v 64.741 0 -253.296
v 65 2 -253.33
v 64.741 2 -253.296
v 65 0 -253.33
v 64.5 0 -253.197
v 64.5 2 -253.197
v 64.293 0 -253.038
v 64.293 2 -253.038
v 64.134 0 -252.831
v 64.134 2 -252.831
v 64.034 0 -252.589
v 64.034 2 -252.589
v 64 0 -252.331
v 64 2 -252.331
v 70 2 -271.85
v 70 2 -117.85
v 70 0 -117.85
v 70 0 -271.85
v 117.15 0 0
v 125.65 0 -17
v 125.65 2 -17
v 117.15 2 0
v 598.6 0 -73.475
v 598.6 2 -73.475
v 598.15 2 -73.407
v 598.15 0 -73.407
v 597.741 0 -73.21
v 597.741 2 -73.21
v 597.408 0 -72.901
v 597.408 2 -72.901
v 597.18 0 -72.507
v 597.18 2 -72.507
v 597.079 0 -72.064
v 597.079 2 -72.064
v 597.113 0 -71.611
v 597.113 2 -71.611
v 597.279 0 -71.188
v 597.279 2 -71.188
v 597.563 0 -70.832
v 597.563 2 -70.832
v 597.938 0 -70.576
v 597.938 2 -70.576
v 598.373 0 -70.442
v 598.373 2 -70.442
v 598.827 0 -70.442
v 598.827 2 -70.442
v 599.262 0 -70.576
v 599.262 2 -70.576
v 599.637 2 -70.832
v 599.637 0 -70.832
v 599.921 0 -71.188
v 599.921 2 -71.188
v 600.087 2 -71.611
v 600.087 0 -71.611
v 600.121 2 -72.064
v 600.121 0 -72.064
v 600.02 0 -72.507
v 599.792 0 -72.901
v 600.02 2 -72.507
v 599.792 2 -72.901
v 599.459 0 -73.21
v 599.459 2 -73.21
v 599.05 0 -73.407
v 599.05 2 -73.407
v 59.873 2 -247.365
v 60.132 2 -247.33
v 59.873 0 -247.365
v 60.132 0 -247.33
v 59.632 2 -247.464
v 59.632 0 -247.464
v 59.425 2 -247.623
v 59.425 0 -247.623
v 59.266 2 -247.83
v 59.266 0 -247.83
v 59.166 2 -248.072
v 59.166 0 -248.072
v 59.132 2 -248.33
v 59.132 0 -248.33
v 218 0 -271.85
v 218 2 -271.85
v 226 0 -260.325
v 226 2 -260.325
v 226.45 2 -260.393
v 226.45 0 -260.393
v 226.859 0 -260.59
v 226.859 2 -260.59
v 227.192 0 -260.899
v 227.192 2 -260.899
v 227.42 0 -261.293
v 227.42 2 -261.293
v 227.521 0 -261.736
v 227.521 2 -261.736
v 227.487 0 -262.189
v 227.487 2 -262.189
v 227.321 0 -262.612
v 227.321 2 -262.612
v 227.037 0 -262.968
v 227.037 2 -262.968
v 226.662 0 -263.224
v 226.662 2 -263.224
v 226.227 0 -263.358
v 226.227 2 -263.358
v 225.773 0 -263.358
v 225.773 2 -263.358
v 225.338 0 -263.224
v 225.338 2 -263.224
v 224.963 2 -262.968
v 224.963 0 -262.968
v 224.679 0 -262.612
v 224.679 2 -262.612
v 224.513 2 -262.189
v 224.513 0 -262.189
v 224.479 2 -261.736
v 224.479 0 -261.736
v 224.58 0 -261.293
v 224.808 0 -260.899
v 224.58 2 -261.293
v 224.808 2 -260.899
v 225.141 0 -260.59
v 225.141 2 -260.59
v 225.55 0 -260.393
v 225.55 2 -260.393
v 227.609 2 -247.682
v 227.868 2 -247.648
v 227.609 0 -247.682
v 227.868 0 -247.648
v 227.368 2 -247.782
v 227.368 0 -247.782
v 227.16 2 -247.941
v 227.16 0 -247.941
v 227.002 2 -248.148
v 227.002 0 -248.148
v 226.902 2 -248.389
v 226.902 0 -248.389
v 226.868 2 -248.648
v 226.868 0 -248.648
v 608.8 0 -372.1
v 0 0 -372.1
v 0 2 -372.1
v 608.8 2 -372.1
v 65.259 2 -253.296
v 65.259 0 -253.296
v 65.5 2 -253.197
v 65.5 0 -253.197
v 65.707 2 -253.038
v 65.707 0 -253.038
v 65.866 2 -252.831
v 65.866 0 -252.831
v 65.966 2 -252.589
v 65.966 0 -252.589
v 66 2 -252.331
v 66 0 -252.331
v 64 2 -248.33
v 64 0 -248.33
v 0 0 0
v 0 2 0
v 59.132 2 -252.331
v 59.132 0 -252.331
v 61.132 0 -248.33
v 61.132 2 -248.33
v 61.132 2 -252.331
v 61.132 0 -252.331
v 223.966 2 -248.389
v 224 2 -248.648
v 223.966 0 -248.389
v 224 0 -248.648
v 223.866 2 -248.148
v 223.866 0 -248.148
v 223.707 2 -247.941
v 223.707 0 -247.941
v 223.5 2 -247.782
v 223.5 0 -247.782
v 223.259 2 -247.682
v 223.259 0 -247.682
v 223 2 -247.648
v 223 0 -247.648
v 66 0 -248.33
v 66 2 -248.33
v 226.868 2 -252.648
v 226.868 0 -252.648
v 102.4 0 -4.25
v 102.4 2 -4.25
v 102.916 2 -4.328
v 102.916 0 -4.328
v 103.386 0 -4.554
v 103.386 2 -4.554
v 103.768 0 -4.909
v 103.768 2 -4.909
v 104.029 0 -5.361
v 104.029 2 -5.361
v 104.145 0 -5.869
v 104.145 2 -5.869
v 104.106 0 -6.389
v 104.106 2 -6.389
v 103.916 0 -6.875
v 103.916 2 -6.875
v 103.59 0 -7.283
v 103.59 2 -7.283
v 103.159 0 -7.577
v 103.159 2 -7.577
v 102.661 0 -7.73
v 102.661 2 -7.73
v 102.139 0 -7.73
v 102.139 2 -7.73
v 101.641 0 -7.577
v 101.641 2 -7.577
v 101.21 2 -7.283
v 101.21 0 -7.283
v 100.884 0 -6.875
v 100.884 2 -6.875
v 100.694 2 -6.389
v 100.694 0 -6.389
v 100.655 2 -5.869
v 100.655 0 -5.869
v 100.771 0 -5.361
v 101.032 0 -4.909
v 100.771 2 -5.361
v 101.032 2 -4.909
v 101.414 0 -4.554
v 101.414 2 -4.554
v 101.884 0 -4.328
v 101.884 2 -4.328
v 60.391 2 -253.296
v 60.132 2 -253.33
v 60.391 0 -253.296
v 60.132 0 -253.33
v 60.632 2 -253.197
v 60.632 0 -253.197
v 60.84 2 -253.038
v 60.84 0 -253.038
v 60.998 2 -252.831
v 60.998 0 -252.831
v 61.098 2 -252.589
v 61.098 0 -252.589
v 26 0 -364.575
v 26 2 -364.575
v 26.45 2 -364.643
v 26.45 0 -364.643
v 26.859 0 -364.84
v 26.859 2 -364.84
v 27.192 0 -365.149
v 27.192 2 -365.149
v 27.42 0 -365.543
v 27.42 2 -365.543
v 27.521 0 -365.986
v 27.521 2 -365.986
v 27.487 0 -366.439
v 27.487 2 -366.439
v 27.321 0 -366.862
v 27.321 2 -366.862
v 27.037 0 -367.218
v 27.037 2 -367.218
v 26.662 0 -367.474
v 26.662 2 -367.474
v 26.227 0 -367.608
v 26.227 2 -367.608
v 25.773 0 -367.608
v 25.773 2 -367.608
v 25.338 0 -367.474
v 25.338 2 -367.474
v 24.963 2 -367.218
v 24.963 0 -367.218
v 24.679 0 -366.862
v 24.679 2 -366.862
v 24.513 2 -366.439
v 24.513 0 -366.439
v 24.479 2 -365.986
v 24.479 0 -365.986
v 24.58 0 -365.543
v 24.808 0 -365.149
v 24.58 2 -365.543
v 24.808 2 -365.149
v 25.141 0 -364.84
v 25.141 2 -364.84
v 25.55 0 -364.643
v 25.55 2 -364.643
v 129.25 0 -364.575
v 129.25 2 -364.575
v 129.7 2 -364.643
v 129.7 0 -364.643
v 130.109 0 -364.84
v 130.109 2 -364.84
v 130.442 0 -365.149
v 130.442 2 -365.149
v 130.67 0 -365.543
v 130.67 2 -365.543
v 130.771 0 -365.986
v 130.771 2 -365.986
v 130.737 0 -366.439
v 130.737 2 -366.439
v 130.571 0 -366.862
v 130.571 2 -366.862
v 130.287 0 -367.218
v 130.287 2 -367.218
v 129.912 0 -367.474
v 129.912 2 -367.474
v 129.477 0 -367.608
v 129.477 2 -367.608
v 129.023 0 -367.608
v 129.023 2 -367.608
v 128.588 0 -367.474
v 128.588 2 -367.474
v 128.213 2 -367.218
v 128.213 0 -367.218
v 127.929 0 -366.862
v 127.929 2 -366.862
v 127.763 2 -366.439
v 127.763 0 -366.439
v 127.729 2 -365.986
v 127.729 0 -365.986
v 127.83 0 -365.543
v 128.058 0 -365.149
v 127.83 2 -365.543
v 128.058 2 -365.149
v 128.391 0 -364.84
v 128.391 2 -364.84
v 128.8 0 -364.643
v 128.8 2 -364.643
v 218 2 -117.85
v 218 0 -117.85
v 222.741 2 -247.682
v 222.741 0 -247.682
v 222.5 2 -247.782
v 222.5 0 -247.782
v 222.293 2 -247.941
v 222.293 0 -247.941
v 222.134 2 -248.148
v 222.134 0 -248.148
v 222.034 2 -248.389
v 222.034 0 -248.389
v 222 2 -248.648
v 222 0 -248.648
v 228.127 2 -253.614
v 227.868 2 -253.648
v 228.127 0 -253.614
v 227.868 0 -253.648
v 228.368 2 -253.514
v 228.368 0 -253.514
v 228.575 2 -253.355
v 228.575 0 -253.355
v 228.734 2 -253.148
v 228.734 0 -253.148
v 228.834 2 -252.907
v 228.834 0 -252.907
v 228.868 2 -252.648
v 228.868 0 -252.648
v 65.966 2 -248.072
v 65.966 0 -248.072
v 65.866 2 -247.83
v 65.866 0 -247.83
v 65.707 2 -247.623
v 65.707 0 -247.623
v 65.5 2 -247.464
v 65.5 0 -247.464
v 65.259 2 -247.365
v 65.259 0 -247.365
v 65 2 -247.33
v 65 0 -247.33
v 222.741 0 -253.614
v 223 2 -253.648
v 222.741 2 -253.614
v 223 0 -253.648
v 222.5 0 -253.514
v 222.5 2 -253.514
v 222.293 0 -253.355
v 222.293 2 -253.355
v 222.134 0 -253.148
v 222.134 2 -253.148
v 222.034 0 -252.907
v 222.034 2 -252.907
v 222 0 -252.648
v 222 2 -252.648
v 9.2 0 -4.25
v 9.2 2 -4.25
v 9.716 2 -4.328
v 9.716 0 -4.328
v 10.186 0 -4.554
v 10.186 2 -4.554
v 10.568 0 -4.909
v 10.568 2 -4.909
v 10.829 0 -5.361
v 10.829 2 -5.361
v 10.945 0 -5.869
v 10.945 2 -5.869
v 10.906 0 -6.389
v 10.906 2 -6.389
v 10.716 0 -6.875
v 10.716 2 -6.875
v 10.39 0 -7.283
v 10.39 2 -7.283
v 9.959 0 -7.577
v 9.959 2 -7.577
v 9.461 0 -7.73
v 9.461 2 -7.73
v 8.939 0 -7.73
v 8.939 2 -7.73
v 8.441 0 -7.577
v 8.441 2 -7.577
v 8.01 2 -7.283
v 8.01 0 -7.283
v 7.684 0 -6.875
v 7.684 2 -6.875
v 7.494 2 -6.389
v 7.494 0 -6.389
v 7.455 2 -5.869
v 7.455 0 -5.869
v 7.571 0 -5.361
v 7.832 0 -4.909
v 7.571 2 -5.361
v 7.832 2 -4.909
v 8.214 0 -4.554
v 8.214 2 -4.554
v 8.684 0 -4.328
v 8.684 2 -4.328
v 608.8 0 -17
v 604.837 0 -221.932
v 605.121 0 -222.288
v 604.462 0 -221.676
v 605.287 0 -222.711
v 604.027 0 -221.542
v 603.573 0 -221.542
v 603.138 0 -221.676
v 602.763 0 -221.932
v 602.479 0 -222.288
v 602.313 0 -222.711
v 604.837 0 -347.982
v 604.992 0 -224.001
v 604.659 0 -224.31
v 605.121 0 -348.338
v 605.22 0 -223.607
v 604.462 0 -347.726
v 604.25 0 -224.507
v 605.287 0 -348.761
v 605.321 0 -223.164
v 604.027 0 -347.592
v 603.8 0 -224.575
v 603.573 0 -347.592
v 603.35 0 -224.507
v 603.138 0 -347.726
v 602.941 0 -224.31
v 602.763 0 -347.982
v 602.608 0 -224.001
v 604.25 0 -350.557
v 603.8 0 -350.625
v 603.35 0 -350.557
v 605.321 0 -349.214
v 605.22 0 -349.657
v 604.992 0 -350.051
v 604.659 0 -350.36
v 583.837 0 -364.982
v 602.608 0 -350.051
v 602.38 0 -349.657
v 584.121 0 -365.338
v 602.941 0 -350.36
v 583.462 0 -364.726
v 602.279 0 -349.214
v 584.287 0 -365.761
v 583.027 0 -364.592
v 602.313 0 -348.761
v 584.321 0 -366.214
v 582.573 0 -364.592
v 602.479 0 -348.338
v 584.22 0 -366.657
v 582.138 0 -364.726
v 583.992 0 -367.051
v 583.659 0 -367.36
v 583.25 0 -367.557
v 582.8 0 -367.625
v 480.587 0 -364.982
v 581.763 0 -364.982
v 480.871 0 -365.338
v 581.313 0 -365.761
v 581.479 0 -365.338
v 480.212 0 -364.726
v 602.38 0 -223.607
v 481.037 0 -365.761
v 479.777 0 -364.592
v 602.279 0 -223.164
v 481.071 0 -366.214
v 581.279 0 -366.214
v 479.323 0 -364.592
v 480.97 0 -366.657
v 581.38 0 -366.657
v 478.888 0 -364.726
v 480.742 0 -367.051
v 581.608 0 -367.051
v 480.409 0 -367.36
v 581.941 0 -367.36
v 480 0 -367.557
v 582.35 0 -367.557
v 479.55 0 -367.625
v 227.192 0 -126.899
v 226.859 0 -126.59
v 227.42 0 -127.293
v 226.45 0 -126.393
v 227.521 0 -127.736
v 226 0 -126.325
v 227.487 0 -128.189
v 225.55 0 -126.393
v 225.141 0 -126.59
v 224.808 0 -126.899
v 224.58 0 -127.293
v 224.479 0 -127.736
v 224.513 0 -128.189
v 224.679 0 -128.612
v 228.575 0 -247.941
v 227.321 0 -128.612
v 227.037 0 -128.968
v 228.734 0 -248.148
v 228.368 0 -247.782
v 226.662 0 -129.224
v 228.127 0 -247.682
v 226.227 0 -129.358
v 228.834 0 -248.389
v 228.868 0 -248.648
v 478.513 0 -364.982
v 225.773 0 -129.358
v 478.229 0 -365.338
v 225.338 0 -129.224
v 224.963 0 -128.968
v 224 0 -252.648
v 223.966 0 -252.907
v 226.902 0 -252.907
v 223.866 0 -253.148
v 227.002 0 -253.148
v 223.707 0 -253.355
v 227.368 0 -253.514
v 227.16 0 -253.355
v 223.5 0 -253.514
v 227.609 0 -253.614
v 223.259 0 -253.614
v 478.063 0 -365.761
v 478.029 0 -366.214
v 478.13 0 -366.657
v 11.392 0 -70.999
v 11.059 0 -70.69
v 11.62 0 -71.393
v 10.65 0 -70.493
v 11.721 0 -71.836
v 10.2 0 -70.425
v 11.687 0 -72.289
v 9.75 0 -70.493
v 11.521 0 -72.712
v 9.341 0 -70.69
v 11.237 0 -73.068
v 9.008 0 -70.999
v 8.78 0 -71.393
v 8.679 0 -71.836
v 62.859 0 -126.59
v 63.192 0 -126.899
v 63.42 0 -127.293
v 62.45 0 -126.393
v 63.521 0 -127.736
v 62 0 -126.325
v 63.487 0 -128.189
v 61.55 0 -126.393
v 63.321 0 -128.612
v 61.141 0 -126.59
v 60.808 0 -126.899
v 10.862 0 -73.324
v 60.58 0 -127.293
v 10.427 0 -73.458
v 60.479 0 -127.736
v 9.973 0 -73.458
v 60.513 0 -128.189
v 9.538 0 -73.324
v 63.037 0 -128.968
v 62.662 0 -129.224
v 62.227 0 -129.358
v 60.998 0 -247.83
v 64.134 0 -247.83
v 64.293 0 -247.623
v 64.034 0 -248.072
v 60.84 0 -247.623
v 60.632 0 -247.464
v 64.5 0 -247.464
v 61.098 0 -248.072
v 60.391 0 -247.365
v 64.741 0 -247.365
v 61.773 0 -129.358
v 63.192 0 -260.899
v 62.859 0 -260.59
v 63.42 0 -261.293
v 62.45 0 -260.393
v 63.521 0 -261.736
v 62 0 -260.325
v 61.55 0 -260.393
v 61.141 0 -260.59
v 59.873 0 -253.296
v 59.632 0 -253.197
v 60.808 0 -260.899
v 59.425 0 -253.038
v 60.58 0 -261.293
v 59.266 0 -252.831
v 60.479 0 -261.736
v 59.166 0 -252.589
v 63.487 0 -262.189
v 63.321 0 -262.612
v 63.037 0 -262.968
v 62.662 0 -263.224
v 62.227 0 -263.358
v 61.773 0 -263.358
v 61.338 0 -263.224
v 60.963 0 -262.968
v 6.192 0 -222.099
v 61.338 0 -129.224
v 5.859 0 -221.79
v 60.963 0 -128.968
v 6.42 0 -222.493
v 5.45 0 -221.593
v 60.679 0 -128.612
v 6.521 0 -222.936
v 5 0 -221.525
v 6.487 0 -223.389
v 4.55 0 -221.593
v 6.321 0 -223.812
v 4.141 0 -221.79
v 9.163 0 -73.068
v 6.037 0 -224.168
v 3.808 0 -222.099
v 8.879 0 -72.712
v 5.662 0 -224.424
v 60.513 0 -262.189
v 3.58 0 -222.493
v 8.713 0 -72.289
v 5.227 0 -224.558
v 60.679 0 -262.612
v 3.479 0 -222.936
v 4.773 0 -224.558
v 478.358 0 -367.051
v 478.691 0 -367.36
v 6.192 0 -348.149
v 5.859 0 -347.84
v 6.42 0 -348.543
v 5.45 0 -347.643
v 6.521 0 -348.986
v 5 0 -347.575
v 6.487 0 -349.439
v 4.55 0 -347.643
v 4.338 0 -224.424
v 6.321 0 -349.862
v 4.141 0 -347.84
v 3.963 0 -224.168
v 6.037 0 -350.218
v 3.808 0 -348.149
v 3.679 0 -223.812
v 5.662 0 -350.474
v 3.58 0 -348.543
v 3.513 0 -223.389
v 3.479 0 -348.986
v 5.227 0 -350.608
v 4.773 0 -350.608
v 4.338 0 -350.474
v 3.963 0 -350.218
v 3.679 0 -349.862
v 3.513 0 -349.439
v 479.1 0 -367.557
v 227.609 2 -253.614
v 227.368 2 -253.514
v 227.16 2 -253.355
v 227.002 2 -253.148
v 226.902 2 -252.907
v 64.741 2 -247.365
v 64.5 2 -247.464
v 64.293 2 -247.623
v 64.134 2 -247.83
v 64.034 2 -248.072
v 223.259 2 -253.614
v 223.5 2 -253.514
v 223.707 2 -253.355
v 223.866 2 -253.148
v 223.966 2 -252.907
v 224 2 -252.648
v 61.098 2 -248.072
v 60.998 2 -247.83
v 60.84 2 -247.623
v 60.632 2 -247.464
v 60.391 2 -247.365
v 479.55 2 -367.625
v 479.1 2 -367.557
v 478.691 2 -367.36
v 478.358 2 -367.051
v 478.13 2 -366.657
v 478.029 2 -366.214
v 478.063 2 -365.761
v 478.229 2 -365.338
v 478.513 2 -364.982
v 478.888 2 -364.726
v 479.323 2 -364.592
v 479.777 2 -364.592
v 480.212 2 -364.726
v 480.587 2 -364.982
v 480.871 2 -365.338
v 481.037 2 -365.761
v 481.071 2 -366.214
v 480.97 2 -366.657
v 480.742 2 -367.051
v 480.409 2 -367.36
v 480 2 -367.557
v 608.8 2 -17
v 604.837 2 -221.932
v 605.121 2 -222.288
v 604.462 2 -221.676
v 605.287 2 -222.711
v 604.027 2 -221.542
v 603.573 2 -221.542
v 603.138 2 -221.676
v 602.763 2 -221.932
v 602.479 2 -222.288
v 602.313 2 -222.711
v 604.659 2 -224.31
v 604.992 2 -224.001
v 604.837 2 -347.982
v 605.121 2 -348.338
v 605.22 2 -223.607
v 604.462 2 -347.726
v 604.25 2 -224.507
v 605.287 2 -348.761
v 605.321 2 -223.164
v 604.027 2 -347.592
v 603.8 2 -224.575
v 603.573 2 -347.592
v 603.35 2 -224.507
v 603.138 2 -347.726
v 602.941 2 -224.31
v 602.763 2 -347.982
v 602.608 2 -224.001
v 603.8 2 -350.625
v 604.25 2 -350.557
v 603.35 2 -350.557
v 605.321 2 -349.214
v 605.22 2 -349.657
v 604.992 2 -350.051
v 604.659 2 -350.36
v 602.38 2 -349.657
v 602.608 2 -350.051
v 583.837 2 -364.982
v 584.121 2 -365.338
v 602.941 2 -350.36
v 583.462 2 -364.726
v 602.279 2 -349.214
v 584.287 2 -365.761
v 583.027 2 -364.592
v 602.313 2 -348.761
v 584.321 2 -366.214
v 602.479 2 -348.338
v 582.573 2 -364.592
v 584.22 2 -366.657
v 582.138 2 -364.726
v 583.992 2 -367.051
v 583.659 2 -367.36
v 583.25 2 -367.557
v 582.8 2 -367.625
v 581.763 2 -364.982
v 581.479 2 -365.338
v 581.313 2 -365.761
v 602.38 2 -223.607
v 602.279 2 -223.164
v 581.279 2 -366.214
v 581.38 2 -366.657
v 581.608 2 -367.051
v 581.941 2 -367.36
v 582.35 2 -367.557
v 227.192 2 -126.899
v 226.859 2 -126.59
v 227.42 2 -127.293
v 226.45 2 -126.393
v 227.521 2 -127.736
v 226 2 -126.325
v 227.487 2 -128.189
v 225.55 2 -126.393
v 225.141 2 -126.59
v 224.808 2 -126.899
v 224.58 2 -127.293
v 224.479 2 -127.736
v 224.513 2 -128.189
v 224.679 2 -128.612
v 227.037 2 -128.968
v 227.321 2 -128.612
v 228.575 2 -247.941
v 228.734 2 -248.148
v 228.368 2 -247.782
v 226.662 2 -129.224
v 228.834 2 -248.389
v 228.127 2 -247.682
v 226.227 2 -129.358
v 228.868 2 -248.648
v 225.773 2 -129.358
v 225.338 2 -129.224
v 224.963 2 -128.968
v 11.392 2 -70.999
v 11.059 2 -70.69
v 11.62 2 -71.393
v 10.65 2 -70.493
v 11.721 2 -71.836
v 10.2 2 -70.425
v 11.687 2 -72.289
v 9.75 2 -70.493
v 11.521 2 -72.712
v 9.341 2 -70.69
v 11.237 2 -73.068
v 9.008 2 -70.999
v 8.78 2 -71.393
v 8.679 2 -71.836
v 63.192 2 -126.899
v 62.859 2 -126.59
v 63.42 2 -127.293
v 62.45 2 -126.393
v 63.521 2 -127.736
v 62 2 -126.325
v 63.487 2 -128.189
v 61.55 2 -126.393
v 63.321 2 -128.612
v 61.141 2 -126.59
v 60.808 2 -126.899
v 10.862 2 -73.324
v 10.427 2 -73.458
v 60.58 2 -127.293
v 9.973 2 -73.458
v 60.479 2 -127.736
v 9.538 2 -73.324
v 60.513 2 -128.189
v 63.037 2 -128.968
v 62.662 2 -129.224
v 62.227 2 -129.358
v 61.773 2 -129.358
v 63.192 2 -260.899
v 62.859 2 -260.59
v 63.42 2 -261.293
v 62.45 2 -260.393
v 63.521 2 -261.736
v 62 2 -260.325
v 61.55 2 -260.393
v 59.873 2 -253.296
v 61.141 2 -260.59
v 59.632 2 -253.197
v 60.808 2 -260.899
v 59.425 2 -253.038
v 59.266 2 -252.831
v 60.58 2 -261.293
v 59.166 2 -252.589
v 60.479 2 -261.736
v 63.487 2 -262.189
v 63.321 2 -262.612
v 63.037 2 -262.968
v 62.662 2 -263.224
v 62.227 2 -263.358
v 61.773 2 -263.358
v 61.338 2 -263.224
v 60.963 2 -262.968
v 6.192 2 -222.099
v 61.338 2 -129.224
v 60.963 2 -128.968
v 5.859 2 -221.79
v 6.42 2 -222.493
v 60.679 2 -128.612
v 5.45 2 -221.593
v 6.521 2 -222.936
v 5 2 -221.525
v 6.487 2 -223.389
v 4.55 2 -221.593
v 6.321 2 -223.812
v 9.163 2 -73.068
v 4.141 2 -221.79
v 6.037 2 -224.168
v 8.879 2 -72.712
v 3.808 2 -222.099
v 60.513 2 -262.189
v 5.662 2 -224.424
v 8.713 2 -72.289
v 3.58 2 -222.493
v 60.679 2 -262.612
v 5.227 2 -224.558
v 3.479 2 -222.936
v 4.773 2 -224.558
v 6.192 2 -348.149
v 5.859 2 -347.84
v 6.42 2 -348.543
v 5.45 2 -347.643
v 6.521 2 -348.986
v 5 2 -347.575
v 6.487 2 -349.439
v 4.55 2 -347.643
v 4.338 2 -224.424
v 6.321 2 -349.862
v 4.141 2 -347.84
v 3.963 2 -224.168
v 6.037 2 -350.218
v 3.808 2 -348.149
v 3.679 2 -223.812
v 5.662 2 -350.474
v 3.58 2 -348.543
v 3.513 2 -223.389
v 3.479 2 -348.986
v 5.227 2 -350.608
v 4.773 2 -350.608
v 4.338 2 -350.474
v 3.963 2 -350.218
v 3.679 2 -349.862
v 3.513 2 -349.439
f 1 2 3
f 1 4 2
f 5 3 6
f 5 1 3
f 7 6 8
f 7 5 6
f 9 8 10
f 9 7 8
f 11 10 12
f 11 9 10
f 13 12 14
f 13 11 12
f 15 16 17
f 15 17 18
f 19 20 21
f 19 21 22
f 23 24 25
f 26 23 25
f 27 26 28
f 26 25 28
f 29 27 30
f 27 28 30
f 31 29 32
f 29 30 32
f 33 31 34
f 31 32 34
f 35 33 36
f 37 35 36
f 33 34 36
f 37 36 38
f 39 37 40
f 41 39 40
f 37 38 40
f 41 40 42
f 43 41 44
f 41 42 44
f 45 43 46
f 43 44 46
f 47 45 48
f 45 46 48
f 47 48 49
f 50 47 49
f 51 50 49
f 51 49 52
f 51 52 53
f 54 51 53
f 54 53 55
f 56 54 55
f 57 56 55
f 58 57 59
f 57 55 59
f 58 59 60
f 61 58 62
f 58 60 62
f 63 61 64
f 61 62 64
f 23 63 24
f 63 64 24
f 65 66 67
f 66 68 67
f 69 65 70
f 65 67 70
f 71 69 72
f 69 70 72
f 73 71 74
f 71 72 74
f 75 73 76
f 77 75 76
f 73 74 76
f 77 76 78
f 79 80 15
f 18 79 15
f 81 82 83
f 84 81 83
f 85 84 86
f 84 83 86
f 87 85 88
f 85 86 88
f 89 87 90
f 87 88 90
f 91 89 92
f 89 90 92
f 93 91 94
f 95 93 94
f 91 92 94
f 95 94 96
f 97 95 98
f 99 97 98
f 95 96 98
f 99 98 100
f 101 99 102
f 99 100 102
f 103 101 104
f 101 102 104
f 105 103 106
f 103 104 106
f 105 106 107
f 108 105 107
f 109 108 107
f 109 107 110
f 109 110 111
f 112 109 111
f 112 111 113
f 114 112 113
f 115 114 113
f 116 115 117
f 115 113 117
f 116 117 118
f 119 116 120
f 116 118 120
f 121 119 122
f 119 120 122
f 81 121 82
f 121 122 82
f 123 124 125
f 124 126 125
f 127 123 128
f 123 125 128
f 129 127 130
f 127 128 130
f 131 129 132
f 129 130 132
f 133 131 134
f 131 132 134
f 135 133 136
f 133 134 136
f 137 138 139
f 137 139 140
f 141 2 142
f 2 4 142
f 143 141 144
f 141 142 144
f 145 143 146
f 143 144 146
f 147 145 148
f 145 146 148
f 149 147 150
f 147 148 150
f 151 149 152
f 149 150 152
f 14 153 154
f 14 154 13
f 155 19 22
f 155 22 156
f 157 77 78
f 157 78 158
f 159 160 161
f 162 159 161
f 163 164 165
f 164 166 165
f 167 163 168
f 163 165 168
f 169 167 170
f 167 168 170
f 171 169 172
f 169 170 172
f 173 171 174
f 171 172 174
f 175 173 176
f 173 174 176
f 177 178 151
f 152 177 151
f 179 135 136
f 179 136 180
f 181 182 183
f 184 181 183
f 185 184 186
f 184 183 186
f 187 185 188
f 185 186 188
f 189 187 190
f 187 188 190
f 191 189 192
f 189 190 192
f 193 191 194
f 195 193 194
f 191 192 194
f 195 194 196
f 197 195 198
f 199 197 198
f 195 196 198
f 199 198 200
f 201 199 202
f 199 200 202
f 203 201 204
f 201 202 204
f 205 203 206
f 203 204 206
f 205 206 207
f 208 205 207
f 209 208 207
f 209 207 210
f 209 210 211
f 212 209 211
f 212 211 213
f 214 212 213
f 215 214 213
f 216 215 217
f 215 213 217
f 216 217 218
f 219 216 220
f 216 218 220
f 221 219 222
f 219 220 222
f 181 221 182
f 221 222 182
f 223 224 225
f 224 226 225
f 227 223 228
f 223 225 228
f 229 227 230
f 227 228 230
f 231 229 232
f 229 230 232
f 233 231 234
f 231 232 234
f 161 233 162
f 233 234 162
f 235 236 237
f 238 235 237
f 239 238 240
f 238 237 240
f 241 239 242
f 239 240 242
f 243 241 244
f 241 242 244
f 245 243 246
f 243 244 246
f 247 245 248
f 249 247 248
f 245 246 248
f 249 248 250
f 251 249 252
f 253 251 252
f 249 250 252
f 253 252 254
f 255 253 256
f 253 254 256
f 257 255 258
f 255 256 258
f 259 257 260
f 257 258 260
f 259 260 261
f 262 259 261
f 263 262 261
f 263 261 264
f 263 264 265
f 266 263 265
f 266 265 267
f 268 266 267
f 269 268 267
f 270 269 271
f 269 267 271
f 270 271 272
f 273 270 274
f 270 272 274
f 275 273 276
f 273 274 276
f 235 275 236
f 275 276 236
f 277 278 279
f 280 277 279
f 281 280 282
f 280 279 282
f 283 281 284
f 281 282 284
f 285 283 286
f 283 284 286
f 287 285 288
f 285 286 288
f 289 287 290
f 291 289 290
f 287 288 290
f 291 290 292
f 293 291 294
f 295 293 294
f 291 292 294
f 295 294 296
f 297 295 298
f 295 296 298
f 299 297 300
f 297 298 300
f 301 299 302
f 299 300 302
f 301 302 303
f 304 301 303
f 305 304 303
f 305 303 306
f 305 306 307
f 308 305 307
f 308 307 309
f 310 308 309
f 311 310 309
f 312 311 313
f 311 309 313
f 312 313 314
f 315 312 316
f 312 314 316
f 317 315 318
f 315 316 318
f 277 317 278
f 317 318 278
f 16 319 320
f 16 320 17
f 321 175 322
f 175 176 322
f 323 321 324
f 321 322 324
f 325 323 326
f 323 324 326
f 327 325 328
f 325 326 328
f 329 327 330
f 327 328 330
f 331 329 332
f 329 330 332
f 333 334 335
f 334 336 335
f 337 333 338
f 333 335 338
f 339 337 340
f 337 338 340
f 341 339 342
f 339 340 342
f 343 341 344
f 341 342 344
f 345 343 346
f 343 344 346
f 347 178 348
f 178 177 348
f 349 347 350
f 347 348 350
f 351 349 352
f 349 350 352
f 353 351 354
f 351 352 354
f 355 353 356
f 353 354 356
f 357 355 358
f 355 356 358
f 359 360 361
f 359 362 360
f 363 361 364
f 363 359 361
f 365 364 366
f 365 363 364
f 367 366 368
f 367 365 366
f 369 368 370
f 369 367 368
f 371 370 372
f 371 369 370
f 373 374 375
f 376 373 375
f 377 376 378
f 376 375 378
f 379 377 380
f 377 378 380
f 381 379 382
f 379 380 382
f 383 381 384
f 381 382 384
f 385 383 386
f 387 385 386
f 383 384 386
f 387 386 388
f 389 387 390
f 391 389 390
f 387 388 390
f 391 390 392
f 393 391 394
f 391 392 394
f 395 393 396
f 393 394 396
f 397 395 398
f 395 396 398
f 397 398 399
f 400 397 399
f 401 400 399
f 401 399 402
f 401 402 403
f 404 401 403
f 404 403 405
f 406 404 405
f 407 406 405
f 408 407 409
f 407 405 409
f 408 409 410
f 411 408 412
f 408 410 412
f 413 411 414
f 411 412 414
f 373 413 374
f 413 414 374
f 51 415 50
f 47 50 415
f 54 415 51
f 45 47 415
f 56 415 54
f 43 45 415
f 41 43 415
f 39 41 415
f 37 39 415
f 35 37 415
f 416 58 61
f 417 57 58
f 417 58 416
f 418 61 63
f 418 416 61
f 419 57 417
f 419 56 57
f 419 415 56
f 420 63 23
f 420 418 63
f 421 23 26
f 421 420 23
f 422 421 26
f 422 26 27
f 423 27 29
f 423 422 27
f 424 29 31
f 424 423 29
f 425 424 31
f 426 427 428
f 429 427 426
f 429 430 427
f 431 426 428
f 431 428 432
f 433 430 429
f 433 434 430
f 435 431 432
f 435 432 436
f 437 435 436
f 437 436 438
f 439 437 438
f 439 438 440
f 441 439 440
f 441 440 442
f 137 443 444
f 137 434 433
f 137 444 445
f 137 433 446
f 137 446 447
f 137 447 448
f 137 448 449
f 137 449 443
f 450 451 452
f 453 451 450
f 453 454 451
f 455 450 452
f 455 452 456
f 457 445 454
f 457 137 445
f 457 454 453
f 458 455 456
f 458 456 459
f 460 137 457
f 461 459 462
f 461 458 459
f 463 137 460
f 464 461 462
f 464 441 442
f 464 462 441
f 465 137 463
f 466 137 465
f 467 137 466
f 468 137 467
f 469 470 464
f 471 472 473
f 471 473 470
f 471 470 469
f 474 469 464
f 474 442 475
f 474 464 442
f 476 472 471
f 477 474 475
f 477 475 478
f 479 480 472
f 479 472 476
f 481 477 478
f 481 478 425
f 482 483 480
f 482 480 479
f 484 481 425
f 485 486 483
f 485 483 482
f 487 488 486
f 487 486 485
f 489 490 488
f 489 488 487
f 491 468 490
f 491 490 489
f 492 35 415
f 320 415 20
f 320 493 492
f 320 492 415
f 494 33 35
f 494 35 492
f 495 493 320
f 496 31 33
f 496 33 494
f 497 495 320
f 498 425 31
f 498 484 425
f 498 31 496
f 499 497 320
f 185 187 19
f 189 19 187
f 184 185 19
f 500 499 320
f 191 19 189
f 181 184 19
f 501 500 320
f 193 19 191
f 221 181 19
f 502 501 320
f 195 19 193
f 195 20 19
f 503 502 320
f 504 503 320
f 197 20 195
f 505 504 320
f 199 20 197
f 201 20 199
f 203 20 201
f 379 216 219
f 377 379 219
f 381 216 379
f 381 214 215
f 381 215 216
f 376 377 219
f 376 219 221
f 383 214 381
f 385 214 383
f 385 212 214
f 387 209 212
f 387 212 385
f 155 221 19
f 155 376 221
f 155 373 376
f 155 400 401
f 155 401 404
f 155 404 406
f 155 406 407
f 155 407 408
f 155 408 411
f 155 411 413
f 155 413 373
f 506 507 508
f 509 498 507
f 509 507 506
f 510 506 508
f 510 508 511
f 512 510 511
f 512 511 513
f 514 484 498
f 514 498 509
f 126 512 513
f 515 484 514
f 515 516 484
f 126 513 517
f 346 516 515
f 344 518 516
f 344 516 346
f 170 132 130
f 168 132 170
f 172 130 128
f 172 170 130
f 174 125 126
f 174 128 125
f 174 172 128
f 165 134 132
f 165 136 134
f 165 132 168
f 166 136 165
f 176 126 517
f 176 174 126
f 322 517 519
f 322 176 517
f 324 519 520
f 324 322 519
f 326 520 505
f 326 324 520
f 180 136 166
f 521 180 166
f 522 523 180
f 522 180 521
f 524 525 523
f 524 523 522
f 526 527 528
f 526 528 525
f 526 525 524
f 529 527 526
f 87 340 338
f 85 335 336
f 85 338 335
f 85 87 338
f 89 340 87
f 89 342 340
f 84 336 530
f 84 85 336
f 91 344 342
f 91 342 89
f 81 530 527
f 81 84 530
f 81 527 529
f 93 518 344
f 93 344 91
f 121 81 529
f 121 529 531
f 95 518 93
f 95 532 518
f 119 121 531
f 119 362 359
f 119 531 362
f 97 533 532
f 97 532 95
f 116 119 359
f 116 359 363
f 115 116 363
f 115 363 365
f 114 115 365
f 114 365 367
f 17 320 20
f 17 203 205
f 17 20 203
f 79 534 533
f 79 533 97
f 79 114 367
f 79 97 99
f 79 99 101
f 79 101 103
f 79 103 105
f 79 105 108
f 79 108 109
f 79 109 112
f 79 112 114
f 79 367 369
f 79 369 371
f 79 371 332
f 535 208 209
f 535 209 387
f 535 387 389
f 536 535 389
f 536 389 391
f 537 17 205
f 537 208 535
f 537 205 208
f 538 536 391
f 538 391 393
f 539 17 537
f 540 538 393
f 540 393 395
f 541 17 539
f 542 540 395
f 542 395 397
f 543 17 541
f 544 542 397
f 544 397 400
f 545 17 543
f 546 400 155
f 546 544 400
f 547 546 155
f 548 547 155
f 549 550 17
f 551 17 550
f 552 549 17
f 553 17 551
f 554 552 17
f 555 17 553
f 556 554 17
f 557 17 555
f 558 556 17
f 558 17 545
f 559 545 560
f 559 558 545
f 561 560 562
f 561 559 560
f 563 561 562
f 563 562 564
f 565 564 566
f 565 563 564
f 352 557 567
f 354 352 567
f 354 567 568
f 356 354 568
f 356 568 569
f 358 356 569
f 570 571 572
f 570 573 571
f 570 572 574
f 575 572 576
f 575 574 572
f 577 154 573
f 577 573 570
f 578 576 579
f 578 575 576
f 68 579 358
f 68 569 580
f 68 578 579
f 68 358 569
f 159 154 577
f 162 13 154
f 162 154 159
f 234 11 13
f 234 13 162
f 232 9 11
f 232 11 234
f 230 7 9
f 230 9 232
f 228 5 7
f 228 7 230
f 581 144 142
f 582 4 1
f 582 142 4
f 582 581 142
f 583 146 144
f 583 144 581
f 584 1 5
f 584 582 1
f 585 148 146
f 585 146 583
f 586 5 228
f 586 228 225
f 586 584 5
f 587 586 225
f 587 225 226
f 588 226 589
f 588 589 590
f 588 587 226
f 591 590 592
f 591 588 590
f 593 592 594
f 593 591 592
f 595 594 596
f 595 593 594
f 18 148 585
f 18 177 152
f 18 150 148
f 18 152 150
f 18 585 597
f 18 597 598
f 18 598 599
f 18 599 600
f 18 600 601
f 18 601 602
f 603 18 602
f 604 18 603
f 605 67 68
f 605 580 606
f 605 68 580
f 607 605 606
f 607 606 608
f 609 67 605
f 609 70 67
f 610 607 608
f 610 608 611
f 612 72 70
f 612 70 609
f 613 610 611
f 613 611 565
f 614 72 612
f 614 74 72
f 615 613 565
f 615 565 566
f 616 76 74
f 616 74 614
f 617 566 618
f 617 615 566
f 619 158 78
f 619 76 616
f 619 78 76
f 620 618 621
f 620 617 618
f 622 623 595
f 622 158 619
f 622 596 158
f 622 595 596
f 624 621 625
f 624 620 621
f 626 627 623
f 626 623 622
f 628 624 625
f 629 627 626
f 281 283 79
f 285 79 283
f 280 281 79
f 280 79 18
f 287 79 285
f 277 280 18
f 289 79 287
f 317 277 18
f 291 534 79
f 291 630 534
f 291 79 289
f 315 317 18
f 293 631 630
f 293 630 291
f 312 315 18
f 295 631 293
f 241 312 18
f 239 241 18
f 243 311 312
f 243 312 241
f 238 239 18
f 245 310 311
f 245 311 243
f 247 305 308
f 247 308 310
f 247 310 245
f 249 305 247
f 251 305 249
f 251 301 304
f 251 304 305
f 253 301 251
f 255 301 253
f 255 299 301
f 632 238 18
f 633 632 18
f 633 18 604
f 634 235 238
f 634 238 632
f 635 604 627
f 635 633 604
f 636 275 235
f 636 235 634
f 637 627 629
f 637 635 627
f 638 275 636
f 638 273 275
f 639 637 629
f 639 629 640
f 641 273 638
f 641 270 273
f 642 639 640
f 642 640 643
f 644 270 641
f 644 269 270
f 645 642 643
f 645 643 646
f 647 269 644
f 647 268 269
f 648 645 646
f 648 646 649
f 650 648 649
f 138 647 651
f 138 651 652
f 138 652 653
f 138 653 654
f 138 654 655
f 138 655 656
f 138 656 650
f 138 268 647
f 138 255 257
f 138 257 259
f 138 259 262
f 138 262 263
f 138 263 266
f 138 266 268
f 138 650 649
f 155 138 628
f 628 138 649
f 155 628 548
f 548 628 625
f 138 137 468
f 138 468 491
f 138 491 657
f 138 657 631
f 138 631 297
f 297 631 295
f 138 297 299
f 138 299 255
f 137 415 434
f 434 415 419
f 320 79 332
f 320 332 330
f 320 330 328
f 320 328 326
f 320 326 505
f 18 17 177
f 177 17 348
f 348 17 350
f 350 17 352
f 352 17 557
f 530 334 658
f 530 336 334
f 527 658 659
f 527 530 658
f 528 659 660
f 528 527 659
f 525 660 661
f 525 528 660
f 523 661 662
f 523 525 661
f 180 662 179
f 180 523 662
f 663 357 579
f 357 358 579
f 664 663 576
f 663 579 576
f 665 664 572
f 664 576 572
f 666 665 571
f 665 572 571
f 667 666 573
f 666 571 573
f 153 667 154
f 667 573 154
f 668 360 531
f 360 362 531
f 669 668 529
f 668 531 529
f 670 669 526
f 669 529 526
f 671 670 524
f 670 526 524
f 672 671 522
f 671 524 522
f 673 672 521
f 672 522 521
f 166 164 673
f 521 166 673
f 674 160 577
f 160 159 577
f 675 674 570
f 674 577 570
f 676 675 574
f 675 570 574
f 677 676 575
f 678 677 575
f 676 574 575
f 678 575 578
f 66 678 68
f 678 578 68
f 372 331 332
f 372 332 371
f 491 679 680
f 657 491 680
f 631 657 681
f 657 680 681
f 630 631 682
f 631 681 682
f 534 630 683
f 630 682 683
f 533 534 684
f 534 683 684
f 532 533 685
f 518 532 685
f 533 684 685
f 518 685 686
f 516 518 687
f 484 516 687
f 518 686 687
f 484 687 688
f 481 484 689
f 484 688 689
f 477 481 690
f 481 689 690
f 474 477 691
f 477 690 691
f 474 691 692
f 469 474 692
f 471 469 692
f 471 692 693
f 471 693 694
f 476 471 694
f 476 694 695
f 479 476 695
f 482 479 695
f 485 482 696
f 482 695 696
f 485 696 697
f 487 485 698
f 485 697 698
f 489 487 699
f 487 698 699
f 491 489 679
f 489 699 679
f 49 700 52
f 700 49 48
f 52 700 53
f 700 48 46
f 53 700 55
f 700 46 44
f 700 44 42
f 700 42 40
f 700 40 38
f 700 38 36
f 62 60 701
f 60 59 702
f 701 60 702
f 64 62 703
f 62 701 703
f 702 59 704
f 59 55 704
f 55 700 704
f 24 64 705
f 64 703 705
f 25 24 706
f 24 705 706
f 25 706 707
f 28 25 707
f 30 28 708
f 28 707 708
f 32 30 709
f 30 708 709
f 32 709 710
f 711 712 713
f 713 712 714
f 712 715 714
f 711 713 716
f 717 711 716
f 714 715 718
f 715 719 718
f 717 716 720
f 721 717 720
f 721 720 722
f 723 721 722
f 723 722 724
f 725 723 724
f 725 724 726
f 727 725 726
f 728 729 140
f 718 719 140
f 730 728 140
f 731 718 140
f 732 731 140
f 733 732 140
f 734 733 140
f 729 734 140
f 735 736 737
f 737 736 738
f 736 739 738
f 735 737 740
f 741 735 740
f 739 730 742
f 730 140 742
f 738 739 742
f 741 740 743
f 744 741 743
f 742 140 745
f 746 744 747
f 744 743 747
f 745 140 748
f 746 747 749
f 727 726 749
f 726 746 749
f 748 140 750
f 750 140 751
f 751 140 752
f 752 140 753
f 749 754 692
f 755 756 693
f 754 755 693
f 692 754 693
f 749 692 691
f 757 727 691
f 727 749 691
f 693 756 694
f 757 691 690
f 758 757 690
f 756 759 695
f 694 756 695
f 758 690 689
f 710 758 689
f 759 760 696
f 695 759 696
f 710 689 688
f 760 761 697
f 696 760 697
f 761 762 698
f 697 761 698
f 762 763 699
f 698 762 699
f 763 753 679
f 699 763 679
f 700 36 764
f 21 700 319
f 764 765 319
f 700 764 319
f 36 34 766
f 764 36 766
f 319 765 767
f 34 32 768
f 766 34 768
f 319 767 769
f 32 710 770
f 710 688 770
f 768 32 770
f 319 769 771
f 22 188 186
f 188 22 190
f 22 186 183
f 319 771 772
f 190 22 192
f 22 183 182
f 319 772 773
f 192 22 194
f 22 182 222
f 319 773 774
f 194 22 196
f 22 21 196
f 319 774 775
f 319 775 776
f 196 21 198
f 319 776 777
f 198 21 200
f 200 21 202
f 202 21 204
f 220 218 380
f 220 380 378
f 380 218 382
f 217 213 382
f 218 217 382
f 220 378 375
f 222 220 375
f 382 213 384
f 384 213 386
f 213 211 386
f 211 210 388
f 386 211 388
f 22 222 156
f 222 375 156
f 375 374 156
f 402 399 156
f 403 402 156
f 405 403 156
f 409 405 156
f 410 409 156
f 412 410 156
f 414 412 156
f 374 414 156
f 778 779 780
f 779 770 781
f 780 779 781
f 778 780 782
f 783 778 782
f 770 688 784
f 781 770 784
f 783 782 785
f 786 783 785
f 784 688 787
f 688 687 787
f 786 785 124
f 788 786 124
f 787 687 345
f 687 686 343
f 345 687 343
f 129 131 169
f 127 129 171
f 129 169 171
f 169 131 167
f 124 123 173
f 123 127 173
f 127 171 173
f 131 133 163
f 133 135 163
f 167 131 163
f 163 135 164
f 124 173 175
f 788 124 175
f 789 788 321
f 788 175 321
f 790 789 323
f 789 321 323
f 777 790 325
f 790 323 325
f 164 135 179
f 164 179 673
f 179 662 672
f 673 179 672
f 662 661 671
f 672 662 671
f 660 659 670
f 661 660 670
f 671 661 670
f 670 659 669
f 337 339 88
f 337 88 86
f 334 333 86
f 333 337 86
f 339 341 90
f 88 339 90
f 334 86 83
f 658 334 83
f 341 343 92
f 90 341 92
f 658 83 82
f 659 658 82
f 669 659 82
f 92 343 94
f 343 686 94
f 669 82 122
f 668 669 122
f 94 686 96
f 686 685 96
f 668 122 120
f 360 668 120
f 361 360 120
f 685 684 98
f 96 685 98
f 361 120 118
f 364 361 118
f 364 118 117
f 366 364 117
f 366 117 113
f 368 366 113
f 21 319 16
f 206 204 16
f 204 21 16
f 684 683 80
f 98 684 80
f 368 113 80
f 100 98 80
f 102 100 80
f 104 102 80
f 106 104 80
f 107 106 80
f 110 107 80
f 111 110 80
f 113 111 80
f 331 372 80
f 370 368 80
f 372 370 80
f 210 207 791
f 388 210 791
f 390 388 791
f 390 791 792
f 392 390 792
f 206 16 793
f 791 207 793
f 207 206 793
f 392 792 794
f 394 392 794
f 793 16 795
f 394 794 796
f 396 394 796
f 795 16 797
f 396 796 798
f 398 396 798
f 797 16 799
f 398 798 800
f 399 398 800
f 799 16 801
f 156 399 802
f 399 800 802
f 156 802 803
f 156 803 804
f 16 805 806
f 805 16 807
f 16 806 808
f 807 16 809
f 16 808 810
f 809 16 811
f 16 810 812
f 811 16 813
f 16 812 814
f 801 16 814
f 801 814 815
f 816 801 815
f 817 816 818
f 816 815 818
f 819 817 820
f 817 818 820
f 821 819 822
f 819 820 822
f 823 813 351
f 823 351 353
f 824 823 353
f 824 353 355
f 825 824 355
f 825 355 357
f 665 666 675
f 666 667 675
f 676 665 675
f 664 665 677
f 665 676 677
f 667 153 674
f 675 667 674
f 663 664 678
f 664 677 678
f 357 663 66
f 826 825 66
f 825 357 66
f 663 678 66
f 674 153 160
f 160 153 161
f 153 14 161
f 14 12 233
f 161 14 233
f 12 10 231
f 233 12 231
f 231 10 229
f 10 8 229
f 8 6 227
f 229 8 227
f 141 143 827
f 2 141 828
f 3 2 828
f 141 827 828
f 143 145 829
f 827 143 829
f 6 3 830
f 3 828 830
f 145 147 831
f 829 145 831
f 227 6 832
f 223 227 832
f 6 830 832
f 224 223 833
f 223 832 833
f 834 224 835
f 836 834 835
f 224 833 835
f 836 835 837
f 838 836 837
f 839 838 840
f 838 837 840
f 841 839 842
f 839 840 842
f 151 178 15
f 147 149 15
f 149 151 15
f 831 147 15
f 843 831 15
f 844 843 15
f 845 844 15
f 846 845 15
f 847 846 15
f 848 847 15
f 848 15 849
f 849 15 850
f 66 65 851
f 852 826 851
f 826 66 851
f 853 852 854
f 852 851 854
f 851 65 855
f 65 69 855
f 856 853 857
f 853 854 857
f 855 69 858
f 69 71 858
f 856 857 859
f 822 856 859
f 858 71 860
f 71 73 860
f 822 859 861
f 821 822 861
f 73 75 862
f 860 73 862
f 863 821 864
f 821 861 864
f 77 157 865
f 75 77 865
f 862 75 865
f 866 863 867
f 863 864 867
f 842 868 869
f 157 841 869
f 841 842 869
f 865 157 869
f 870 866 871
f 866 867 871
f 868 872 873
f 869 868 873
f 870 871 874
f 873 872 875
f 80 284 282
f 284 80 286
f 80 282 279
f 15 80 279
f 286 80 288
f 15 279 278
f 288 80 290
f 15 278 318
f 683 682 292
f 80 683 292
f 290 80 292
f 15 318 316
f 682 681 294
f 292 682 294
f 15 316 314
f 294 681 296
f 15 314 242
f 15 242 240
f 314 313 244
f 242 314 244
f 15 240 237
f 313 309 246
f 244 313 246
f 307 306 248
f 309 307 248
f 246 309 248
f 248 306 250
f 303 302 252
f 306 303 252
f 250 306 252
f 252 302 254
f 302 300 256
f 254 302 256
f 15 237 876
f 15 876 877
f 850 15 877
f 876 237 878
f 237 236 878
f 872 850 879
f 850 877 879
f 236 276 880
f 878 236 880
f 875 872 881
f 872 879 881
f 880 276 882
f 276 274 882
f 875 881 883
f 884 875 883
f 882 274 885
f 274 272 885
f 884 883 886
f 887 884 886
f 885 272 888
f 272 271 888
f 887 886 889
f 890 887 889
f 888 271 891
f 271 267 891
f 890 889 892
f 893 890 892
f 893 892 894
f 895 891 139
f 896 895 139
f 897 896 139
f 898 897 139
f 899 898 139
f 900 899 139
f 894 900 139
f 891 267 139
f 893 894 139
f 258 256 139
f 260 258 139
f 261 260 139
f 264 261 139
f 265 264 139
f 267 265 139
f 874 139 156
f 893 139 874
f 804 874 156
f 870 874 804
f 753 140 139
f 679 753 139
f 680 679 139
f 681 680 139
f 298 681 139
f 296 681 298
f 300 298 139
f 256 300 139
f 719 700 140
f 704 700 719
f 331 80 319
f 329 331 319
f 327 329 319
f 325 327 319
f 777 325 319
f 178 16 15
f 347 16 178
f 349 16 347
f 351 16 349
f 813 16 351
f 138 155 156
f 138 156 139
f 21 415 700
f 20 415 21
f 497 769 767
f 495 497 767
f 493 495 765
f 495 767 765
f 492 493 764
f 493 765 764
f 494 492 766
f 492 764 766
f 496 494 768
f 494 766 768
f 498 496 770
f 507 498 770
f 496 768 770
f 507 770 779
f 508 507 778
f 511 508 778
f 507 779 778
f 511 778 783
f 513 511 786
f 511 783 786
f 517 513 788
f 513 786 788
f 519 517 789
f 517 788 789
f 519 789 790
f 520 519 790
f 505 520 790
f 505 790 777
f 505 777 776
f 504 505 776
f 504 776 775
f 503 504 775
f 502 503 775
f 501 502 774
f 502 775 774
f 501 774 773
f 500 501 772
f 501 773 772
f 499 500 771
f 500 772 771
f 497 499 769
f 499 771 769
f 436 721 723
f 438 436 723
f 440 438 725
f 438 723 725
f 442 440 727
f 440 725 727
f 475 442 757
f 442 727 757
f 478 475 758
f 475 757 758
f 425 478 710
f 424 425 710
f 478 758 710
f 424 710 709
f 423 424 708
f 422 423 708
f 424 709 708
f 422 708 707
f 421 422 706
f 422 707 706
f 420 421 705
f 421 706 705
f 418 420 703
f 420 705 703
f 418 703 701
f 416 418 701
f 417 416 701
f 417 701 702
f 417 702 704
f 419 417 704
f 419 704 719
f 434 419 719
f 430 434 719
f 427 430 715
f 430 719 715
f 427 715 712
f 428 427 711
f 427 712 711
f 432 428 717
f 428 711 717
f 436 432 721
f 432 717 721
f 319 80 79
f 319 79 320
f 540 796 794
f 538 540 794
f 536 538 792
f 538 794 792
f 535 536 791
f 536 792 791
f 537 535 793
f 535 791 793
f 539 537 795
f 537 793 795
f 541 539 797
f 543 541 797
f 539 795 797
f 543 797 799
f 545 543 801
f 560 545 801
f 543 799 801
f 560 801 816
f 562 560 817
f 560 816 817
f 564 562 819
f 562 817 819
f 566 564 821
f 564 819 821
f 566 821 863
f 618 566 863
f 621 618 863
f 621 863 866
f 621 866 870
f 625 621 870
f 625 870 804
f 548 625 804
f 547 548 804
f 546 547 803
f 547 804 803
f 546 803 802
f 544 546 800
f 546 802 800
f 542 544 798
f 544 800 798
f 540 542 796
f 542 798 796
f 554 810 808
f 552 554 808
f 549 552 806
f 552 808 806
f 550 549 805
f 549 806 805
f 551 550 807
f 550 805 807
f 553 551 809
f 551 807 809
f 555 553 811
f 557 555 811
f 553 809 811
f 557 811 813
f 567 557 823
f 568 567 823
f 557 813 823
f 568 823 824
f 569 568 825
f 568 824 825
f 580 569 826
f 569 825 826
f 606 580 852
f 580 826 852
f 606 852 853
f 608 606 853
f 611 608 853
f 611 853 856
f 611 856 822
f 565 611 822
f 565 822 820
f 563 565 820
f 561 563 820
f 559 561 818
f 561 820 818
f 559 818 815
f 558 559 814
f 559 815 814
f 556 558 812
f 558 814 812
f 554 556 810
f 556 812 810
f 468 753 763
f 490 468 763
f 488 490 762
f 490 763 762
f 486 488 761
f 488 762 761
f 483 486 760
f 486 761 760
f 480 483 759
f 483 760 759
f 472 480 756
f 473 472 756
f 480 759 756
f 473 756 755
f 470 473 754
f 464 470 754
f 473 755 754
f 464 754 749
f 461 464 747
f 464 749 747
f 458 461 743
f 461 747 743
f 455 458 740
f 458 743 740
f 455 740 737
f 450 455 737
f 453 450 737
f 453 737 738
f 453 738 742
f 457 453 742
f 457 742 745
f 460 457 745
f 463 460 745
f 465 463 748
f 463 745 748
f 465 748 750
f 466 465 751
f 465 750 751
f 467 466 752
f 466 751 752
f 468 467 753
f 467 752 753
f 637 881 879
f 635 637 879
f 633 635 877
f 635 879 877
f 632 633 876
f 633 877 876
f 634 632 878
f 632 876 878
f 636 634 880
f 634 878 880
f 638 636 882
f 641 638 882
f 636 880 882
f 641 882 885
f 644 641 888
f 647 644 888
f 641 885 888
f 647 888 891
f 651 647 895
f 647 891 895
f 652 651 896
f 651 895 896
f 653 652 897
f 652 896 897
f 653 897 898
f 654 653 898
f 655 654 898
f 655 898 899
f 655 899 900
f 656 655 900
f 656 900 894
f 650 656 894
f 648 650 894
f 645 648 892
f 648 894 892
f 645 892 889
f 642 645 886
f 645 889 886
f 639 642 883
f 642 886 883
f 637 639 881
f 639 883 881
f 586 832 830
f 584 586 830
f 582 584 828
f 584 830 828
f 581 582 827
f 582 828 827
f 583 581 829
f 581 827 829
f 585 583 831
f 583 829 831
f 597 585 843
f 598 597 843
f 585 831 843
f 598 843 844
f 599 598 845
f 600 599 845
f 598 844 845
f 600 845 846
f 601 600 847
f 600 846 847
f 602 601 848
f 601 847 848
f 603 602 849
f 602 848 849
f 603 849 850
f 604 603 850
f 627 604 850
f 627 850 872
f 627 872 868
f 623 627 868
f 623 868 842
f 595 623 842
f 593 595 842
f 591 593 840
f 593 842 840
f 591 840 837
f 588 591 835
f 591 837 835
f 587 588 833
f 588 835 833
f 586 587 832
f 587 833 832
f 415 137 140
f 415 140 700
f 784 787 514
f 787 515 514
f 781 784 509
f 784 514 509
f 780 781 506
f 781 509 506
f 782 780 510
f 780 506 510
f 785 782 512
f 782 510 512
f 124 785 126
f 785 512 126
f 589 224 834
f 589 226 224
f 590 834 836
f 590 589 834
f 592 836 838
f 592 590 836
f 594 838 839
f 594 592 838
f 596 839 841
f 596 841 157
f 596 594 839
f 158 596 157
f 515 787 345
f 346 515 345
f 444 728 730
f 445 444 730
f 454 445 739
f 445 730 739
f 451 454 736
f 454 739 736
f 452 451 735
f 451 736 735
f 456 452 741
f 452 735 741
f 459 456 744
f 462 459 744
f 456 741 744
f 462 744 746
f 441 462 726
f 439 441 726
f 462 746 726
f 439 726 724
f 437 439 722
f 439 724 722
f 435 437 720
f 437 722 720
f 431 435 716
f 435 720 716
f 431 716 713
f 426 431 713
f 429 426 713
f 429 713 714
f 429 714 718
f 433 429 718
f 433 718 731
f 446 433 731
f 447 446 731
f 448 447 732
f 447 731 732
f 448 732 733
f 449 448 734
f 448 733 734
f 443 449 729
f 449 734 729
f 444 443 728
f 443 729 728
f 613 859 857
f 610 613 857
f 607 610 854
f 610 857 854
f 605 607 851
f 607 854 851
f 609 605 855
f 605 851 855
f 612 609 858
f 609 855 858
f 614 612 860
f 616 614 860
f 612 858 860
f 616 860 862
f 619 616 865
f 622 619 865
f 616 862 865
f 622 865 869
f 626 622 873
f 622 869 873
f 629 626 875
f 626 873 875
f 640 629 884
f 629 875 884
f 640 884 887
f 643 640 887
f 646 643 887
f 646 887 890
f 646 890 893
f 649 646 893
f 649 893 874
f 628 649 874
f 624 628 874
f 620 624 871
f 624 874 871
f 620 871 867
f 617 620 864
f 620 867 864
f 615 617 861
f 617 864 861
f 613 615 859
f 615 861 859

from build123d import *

# Parameters (mm, degrees)
EXTRUDE_1_DEPTH     = 2
SKETCH_2_R          = 1.525
SKETCH_2_R_2        = 1.75
CUT_EXTRUDE_1_DEPTH = 2
SKETCH_3_W          = 2
SKETCH_3_H          = 6
CUT_EXTRUDE_2_DEPTH = 10
FILLET_2_R          = 1


with BuildPart() as part:
    # 草图1 → 凸台-拉伸1 (new body)
    with BuildSketch(Plane(origin=(0, 0, 0), x_dir=(1, 0, 0), z_dir=(0, 1, 0))):
        Polygon((0, 0), (0, 372.1), (608.8, 372.1), (608.8, 17), (125.65, 17), (117.15, 0), align=None)
    extrude(amount=EXTRUDE_1_DEPTH)

    # 草图2 → 切除-拉伸1 (cut)
    with BuildSketch(Plane(origin=(0, 2, 0), x_dir=(1, 0, 0), z_dir=(0, 1, 0))):
        with Locations(Location((5, 349.1, 0), (0, 0, 270))):
            Circle(SKETCH_2_R)
        with Locations(Location((26, 366.1, 0), (0, 0, 270))):
            Circle(SKETCH_2_R)
        with Locations(Location((129.25, 366.1, 0), (0, 0, 270))):
            Circle(SKETCH_2_R)
        with Locations(Location((5, 223.05, 0), (0, 0, 270))):
            Circle(SKETCH_2_R)
        with Locations(Location((603.8, 223.05, 0), (0, 0, 90))):
            Circle(SKETCH_2_R)
        with Locations(Location((479.55, 366.1, 0), (0, 0, 90))):
            Circle(SKETCH_2_R)
        with Locations(Location((582.8, 366.1, 0), (0, 0, 90))):
            Circle(SKETCH_2_R)
        with Locations(Location((603.8, 349.1, 0), (0, 0, 90))):
            Circle(SKETCH_2_R)
        with Locations(Location((10.2, 71.95, 0), (0, 0, 270))):
            Circle(SKETCH_2_R)
        with Locations(Location((598.6, 71.95, 0), (0, 0, 90))):
            Circle(SKETCH_2_R)
        with Locations(Location((9.2, 6, 0), (0, 0, 270))):
            Circle(SKETCH_2_R_2)
        with Locations(Location((102.4, 6, 0), (0, 0, 270))):
            Circle(SKETCH_2_R_2)
        with Locations(Location((62, 261.85, 0), (0, 0, 270))):
            Circle(SKETCH_2_R)
        with Locations(Location((62, 127.85, 0), (0, 0, 270))):
            Circle(SKETCH_2_R)
        with Locations(Location((226, 261.85, 0), (0, 0, 270))):
            Circle(SKETCH_2_R)
        with Locations(Location((226, 127.85, 0), (0, 0, 270))):
            Circle(SKETCH_2_R)
        Polygon((70, 271.85), (75, 271.85), (94, 271.85), (155, 271.85), (184, 271.85), (218, 271.85), (218, 117.85), (70, 117.85), align=None)
    extrude(amount=-CUT_EXTRUDE_1_DEPTH, mode=Mode.SUBTRACT)

    # 草图3 → 切除-拉伸2 (cut)
    with BuildSketch(Plane(origin=(0, 2, 0), x_dir=(1, 0, 0), z_dir=(0, 1, 0))):
        with Locations((65, 250.330488495)):
            Rectangle(SKETCH_3_W, SKETCH_3_H)
        with Locations((60.132371309, 250.330488495)):
            Rectangle(SKETCH_3_W, SKETCH_3_H)
        with Locations((227.867628691, 250.647738708)):
            Rectangle(SKETCH_3_W, SKETCH_3_H)
        with Locations((223, 250.647738708)):
            Rectangle(SKETCH_3_W, SKETCH_3_H)
    extrude(amount=-CUT_EXTRUDE_2_DEPTH, mode=Mode.SUBTRACT)

    # 圆角2
    fillet_2_edges = [part.edges().sort_by_distance(p)[0] for p in [
        (61.132371309, 1, -247.330488495),
        (59.132371309, 1, -247.330488495),
        (66, 1, -247.330488495),
        (64, 1, -247.330488495),
        (59.132371309, 1, -253.330488495),
        (61.132371309, 1, -253.330488495),
        (228.867628691, 1, -247.647738708),
        (222, 1, -247.647738708),
        (228.867628691, 1, -253.647738708),
        (224, 1, -253.647738708),
        (226.867628691, 1, -253.647738708),
        (222, 1, -253.647738708),
        (64, 1, -253.330488495),
        (66, 1, -253.330488495),
        (224, 1, -247.647738708),
        (226.867628691, 1, -247.647738708),
    ]]
    fillet(fillet_2_edges, radius=FILLET_2_R - 0.0001)  # a hair under: the kernel refuses the full size


solid = part.part
